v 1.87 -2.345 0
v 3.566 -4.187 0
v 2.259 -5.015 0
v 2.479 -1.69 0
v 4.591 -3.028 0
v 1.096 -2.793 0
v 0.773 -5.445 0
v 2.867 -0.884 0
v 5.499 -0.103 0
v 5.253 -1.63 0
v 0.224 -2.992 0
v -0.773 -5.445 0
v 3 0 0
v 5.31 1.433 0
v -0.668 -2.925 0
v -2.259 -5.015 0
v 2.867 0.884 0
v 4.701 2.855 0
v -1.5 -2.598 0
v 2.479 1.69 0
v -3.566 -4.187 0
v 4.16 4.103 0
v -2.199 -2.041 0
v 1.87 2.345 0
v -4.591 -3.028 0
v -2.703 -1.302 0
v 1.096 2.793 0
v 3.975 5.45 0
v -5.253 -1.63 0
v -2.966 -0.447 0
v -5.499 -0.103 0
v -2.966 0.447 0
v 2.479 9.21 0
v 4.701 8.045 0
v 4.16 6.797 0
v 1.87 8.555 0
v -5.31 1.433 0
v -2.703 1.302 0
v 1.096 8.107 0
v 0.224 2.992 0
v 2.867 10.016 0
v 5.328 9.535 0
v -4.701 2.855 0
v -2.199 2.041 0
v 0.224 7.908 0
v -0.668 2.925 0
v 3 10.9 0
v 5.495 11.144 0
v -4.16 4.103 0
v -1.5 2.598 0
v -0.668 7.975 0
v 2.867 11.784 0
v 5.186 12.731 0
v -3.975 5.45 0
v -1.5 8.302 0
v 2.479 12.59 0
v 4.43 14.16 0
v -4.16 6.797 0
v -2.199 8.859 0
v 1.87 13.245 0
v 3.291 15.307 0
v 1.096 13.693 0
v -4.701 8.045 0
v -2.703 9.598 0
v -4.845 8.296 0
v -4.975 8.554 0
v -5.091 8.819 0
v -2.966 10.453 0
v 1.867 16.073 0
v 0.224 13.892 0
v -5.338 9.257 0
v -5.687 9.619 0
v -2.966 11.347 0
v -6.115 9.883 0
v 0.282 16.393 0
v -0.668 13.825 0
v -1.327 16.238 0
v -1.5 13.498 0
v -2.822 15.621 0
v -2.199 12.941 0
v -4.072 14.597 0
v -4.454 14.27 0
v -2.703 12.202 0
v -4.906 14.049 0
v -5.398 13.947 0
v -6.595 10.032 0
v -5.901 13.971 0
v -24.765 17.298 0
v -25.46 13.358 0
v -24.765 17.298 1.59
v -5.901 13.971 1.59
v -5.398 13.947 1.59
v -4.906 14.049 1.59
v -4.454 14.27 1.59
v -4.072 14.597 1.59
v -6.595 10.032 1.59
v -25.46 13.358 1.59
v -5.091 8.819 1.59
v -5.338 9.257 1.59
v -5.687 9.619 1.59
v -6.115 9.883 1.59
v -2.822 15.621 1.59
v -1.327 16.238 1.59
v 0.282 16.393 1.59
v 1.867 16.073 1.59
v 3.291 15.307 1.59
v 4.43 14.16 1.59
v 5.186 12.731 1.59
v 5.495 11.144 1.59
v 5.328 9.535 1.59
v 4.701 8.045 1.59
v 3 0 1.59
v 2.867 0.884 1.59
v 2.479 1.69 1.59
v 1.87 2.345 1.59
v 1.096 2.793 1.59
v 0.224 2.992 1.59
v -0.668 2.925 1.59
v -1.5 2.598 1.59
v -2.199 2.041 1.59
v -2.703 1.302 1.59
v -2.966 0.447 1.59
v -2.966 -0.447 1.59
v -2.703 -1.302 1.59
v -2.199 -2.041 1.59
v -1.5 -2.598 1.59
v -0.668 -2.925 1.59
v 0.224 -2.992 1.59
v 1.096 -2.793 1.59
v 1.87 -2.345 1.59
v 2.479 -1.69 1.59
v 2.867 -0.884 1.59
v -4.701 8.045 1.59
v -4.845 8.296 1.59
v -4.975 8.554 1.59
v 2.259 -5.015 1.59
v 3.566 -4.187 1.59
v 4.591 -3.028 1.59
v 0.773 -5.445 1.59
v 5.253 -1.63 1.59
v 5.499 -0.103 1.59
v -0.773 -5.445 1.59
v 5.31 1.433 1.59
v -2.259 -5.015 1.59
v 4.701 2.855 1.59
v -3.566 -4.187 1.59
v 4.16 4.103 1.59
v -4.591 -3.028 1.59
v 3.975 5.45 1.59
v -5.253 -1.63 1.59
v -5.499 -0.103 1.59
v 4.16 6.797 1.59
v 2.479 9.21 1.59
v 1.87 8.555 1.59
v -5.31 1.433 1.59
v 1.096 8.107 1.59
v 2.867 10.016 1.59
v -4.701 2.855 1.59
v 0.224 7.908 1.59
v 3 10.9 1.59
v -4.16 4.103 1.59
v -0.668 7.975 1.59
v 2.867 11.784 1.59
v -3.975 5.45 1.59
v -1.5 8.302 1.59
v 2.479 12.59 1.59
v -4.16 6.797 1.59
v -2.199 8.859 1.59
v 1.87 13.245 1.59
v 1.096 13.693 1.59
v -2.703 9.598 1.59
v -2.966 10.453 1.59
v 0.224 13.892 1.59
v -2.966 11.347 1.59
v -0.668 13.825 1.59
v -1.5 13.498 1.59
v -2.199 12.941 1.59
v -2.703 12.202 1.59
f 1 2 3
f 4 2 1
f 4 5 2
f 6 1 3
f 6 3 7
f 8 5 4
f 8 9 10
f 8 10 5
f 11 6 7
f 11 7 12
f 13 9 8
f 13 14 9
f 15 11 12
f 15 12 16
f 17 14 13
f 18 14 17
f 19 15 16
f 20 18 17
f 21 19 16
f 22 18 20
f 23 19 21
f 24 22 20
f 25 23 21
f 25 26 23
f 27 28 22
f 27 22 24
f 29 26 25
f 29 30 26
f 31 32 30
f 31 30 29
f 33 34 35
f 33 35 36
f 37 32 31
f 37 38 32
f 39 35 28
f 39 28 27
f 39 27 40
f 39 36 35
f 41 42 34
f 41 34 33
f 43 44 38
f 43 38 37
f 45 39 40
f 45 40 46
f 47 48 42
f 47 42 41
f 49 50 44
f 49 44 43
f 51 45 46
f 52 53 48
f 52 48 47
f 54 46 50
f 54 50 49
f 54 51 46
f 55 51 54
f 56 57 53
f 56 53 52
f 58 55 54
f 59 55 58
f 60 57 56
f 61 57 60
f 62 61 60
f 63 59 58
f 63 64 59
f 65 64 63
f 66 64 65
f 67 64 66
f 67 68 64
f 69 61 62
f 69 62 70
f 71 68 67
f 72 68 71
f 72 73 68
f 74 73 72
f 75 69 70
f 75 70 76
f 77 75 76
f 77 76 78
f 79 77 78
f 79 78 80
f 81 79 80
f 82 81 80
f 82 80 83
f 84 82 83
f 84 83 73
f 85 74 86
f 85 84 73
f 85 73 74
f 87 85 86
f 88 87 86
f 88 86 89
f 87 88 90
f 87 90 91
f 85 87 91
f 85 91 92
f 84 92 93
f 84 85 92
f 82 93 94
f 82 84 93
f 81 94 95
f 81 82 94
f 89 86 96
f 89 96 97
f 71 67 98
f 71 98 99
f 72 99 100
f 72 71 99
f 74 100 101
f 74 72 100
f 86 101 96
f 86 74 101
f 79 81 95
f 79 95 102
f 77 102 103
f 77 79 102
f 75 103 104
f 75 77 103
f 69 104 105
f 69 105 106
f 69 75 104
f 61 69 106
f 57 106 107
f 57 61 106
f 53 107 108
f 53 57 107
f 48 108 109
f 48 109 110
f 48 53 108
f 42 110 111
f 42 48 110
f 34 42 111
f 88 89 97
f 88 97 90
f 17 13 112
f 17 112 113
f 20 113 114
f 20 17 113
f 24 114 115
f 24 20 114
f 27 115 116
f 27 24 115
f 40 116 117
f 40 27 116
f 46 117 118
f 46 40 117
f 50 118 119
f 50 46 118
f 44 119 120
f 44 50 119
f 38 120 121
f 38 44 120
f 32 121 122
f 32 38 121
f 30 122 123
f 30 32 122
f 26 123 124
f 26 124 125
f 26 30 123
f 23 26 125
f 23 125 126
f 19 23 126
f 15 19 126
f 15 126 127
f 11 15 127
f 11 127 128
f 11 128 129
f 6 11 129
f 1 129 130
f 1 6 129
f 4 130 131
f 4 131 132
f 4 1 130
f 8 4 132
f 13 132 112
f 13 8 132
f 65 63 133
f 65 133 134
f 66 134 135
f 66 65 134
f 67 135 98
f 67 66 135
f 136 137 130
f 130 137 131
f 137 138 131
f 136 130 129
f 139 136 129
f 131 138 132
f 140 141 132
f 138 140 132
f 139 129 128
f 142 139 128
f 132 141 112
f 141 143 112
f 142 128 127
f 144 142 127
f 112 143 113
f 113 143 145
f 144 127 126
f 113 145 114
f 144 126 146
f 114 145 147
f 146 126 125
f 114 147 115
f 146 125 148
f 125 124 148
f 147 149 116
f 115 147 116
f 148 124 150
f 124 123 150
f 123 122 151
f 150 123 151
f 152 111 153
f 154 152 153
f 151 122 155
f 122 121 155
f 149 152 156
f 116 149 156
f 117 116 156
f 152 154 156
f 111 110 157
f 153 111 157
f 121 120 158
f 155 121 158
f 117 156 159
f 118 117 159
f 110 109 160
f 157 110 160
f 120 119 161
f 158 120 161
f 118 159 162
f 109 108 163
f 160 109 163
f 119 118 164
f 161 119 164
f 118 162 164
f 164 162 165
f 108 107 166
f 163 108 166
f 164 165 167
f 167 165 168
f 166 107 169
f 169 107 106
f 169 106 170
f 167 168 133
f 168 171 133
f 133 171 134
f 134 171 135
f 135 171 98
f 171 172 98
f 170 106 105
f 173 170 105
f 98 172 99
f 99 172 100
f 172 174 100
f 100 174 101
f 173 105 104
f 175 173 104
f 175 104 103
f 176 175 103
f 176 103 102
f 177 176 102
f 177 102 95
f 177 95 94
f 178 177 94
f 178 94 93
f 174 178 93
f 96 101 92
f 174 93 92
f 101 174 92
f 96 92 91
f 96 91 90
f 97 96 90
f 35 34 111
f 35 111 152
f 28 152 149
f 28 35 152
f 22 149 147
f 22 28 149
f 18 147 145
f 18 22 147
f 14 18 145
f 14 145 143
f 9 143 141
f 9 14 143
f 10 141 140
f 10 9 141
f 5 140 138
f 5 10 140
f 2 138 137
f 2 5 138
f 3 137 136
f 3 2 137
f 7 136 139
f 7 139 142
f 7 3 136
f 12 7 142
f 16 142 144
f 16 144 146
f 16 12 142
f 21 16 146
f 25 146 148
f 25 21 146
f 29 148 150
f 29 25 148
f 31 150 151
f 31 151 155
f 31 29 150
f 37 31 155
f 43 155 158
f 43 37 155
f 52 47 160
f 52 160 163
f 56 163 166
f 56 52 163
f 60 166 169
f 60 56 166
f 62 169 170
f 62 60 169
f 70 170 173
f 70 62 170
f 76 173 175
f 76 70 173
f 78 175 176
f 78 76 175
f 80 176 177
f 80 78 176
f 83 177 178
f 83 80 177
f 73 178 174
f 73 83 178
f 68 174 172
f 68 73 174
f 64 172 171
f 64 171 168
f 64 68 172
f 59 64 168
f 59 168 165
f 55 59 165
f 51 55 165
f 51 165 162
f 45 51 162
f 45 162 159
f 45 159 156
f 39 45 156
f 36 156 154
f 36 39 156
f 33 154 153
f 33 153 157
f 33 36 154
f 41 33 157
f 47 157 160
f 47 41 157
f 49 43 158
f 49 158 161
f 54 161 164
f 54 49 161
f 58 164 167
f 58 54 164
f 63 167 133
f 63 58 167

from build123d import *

# Parameters (mm, degrees)
SKETCH1_R           = 3
BOSS_EXTRUDE1_DEPTH = 1.59


with BuildPart() as part:
    # Sketch1 → Boss-Extrude1 (new body)
    with BuildSketch(Plane.XY):
        with BuildLine():
            ThreePointArc((-5.900608413, 13.97128969), (-4.905988344, 14.048559559), (-4.072428842, 14.59666381))
            ThreePointArc((-4.072428842, 14.59666381), (3.290759997, 15.306914867), (4.701099283, 8.045238095))
            ThreePointArc((4.701099283, 8.045238095), (3.974825904, 5.45), (4.701099283, 2.854761905))
            ThreePointArc((4.701099283, 2.854761905), (0, -5.5), (-4.701099283, 2.854761905))
            ThreePointArc((-4.701099283, 2.854761905), (-3.974825904, 5.45), (-4.701099283, 8.045238095))
            ThreePointArc((-4.701099283, 8.045238095), (-4.911398404, 8.424486778), (-5.091164818, 8.819124992))
            ThreePointArc((-5.091164818, 8.819124992), (-5.686991836, 9.619268653), (-6.595201124, 10.032058678))
            Line((-6.595201124, 10.032058678), (-25.459894057, 13.358413024))
            Line((-25.459894057, 13.358413024), (-24.765301346, 17.297644037))
            Line((-24.765301346, 17.297644037), (-5.900608413, 13.97128969))
        make_face()
        Circle(SKETCH1_R, mode=Mode.SUBTRACT)
        with Locations((0, 10.9)):
            Circle(SKETCH1_R, mode=Mode.SUBTRACT)
    extrude(amount=BOSS_EXTRUDE1_DEPTH)


solid = part.part
